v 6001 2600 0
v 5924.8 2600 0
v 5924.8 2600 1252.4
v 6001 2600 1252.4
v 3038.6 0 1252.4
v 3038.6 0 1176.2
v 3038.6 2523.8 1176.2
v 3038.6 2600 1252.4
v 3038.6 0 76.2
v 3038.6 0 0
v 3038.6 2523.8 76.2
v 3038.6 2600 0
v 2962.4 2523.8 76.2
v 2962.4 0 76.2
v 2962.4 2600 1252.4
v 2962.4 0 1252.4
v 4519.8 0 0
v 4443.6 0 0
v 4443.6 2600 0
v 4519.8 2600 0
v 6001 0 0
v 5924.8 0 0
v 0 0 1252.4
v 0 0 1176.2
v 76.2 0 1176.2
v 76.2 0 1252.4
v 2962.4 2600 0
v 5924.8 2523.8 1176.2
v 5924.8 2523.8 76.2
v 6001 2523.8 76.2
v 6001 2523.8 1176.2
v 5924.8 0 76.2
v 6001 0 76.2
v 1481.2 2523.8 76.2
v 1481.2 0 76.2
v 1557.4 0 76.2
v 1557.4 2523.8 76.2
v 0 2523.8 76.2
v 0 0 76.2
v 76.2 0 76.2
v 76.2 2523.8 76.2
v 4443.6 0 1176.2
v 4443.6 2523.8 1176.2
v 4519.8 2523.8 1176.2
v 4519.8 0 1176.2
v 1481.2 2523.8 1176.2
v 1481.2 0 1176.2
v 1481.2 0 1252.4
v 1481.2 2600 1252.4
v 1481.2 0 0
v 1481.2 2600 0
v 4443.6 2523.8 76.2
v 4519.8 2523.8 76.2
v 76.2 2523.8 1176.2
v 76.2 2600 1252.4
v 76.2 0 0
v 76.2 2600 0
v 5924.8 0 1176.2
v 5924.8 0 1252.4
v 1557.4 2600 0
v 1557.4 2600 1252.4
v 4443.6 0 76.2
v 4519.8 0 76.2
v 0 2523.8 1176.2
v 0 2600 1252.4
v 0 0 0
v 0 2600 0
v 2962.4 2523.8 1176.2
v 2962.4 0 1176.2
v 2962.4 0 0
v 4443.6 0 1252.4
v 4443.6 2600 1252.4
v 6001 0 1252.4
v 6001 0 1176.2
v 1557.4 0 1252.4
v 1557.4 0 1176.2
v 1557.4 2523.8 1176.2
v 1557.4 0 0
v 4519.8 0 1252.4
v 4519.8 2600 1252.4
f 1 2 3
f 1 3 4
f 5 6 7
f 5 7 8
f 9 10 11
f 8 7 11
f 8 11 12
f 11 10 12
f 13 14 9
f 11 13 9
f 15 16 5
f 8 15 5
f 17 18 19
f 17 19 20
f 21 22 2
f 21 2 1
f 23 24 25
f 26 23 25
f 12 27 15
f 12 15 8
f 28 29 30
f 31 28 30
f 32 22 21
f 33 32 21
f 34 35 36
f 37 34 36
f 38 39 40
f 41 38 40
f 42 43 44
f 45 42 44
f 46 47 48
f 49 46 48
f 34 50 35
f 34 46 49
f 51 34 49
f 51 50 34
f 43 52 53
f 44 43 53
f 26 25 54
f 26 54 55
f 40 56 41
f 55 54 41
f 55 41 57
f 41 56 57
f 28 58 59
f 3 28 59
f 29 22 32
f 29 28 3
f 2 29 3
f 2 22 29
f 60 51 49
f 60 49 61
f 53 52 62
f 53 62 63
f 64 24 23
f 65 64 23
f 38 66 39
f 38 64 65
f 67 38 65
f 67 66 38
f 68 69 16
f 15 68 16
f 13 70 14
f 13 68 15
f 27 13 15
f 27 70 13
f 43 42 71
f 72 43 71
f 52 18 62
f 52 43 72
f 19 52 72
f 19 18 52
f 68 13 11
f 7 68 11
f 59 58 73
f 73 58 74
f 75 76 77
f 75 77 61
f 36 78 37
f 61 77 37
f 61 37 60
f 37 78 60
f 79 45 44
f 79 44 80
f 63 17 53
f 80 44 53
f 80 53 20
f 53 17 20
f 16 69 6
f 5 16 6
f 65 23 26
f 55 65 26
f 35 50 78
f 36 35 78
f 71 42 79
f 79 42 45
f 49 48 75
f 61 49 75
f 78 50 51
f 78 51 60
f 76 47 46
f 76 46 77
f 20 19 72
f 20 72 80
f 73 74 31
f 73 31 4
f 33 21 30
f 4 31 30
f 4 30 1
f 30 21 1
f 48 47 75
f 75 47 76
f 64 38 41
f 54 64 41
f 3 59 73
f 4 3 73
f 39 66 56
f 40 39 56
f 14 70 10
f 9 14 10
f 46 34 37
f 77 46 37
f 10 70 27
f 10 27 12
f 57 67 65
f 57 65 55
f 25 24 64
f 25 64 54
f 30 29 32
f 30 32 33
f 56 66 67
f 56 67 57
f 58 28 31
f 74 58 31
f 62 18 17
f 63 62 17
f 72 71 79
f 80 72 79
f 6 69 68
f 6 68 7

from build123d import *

# Parameters (mm, degrees)
CROQUIS1_W                 = 76.2
CROQUIS1_H                 = 76.2
SALIENTE_EXTRUIR1_DEPTH    = 2600
SALIENTE_EXTRUIR1_2_DEPTH  = 2600
SALIENTE_EXTRUIR1_3_DEPTH  = 2600
SALIENTE_EXTRUIR1_4_DEPTH  = 2600
SALIENTE_EXTRUIR1_5_DEPTH  = 2600
SALIENTE_EXTRUIR1_6_DEPTH  = 2600
SALIENTE_EXTRUIR1_7_DEPTH  = 2600
SALIENTE_EXTRUIR1_8_DEPTH  = 2600
SALIENTE_EXTRUIR1_9_DEPTH  = 2600
SALIENTE_EXTRUIR1_10_DEPTH = 2600
CROQUIS2_W                 = 76.2
CROQUIS2_H                 = 76.2
SALIENTE_EXTRUIR2_DEPTH    = 1100


with BuildPart() as part:
    # Croquis1 → Saliente-Extruir1 (new body)
    with BuildSketch(Plane(origin=(0, 0, 0), x_dir=(1, 0, 0), z_dir=(0, 1, 0))):
        with Locations((38.1, -38.1)):
            Rectangle(CROQUIS1_W, CROQUIS1_H)
    extrude(amount=SALIENTE_EXTRUIR1_DEPTH)



with BuildPart() as body_2:
    # Croquis1 → Saliente-Extruir1 2 (new body)
    with BuildSketch(Plane(origin=(0, 0, 0), x_dir=(1, 0, 0), z_dir=(0, 1, 0))):
        with Locations((1519.3, -38.1)):
            Rectangle(CROQUIS1_W, CROQUIS1_H)
    extrude(amount=SALIENTE_EXTRUIR1_2_DEPTH)


with BuildPart() as body_3:
    # Croquis1 → Saliente-Extruir1 3 (new body)
    with BuildSketch(Plane(origin=(0, 0, 0), x_dir=(1, 0, 0), z_dir=(0, 1, 0))):
        with Locations((3000.5, -38.1)):
            Rectangle(CROQUIS1_W, CROQUIS1_H)
    extrude(amount=SALIENTE_EXTRUIR1_3_DEPTH)


with BuildPart() as body_4:
    # Croquis1 → Saliente-Extruir1 4 (new body)
    with BuildSketch(Plane(origin=(0, 0, 0), x_dir=(1, 0, 0), z_dir=(0, 1, 0))):
        with Locations((4481.7, -38.1)):
            Rectangle(CROQUIS1_W, CROQUIS1_H)
    extrude(amount=SALIENTE_EXTRUIR1_4_DEPTH)


with BuildPart() as body_5:
    # Croquis1 → Saliente-Extruir1 5 (new body)
    with BuildSketch(Plane(origin=(0, 0, 0), x_dir=(1, 0, 0), z_dir=(0, 1, 0))):
        with Locations((5962.9, -38.1)):
            Rectangle(CROQUIS1_W, CROQUIS1_H)
    extrude(amount=SALIENTE_EXTRUIR1_5_DEPTH)


with BuildPart() as body_6:
    # Croquis1 → Saliente-Extruir1 6 (new body)
    with BuildSketch(Plane(origin=(0, 0, 0), x_dir=(1, 0, 0), z_dir=(0, 1, 0))):
        with Locations((5962.9, -1214.3)):
            Rectangle(CROQUIS1_W, CROQUIS1_H)
    extrude(amount=SALIENTE_EXTRUIR1_6_DEPTH)


with BuildPart() as body_7:
    # Croquis1 → Saliente-Extruir1 7 (new body)
    with BuildSketch(Plane(origin=(0, 0, 0), x_dir=(1, 0, 0), z_dir=(0, 1, 0))):
        with Locations((4481.7, -1214.3)):
            Rectangle(CROQUIS1_W, CROQUIS1_H)
    extrude(amount=SALIENTE_EXTRUIR1_7_DEPTH)


with BuildPart() as body_8:
    # Croquis1 → Saliente-Extruir1 8 (new body)
    with BuildSketch(Plane(origin=(0, 0, 0), x_dir=(1, 0, 0), z_dir=(0, 1, 0))):
        with Locations((3000.5, -1214.3)):
            Rectangle(CROQUIS1_W, CROQUIS1_H)
    extrude(amount=SALIENTE_EXTRUIR1_8_DEPTH)


with BuildPart() as body_9:
    # Croquis1 → Saliente-Extruir1 9 (new body)
    with BuildSketch(Plane(origin=(0, 0, 0), x_dir=(1, 0, 0), z_dir=(0, 1, 0))):
        with Locations((1519.3, -1214.3)):
            Rectangle(CROQUIS1_W, CROQUIS1_H)
    extrude(amount=SALIENTE_EXTRUIR1_9_DEPTH)


with BuildPart() as body_10:
    # Croquis1 → Saliente-Extruir1 10 (new body)
    with BuildSketch(Plane(origin=(0, 0, 0), x_dir=(1, 0, 0), z_dir=(0, 1, 0))):
        with Locations((38.1, -1214.3)):
            Rectangle(CROQUIS1_W, CROQUIS1_H)
    extrude(amount=SALIENTE_EXTRUIR1_10_DEPTH)


with BuildPart() as part_1:
    add(part.part)

    add(body_2.part)  # Saliente-Extruir2 merges body 2

    add(body_3.part)  # Saliente-Extruir2 merges body 3

    add(body_4.part)  # Saliente-Extruir2 merges body 4

    add(body_5.part)  # Saliente-Extruir2 merges body 5

    add(body_6.part)  # Saliente-Extruir2 merges body 6

    add(body_7.part)  # Saliente-Extruir2 merges body 7

    add(body_8.part)  # Saliente-Extruir2 merges body 8

    add(body_9.part)  # Saliente-Extruir2 merges body 9

    add(body_10.part)  # Saliente-Extruir2 merges body 10
    # Croquis2 → Saliente-Extruir2 (add)
    with BuildSketch(Plane.XY.offset(76.2)):
        with Locations((38.1, 2561.9)):
            Rectangle(CROQUIS2_W, CROQUIS2_H)
        with Locations((1519.3, 2561.9)):
            Rectangle(CROQUIS2_W, CROQUIS2_H)
        with Locations((3000.5, 2561.9)):
            Rectangle(CROQUIS2_W, CROQUIS2_H)
        with Locations((4481.7, 2561.9)):
            Rectangle(CROQUIS2_W, CROQUIS2_H)
        with Locations((5962.9, 2561.9)):
            Rectangle(CROQUIS2_W, CROQUIS2_H)
    extrude(amount=SALIENTE_EXTRUIR2_DEPTH)


solid = part_1.part
